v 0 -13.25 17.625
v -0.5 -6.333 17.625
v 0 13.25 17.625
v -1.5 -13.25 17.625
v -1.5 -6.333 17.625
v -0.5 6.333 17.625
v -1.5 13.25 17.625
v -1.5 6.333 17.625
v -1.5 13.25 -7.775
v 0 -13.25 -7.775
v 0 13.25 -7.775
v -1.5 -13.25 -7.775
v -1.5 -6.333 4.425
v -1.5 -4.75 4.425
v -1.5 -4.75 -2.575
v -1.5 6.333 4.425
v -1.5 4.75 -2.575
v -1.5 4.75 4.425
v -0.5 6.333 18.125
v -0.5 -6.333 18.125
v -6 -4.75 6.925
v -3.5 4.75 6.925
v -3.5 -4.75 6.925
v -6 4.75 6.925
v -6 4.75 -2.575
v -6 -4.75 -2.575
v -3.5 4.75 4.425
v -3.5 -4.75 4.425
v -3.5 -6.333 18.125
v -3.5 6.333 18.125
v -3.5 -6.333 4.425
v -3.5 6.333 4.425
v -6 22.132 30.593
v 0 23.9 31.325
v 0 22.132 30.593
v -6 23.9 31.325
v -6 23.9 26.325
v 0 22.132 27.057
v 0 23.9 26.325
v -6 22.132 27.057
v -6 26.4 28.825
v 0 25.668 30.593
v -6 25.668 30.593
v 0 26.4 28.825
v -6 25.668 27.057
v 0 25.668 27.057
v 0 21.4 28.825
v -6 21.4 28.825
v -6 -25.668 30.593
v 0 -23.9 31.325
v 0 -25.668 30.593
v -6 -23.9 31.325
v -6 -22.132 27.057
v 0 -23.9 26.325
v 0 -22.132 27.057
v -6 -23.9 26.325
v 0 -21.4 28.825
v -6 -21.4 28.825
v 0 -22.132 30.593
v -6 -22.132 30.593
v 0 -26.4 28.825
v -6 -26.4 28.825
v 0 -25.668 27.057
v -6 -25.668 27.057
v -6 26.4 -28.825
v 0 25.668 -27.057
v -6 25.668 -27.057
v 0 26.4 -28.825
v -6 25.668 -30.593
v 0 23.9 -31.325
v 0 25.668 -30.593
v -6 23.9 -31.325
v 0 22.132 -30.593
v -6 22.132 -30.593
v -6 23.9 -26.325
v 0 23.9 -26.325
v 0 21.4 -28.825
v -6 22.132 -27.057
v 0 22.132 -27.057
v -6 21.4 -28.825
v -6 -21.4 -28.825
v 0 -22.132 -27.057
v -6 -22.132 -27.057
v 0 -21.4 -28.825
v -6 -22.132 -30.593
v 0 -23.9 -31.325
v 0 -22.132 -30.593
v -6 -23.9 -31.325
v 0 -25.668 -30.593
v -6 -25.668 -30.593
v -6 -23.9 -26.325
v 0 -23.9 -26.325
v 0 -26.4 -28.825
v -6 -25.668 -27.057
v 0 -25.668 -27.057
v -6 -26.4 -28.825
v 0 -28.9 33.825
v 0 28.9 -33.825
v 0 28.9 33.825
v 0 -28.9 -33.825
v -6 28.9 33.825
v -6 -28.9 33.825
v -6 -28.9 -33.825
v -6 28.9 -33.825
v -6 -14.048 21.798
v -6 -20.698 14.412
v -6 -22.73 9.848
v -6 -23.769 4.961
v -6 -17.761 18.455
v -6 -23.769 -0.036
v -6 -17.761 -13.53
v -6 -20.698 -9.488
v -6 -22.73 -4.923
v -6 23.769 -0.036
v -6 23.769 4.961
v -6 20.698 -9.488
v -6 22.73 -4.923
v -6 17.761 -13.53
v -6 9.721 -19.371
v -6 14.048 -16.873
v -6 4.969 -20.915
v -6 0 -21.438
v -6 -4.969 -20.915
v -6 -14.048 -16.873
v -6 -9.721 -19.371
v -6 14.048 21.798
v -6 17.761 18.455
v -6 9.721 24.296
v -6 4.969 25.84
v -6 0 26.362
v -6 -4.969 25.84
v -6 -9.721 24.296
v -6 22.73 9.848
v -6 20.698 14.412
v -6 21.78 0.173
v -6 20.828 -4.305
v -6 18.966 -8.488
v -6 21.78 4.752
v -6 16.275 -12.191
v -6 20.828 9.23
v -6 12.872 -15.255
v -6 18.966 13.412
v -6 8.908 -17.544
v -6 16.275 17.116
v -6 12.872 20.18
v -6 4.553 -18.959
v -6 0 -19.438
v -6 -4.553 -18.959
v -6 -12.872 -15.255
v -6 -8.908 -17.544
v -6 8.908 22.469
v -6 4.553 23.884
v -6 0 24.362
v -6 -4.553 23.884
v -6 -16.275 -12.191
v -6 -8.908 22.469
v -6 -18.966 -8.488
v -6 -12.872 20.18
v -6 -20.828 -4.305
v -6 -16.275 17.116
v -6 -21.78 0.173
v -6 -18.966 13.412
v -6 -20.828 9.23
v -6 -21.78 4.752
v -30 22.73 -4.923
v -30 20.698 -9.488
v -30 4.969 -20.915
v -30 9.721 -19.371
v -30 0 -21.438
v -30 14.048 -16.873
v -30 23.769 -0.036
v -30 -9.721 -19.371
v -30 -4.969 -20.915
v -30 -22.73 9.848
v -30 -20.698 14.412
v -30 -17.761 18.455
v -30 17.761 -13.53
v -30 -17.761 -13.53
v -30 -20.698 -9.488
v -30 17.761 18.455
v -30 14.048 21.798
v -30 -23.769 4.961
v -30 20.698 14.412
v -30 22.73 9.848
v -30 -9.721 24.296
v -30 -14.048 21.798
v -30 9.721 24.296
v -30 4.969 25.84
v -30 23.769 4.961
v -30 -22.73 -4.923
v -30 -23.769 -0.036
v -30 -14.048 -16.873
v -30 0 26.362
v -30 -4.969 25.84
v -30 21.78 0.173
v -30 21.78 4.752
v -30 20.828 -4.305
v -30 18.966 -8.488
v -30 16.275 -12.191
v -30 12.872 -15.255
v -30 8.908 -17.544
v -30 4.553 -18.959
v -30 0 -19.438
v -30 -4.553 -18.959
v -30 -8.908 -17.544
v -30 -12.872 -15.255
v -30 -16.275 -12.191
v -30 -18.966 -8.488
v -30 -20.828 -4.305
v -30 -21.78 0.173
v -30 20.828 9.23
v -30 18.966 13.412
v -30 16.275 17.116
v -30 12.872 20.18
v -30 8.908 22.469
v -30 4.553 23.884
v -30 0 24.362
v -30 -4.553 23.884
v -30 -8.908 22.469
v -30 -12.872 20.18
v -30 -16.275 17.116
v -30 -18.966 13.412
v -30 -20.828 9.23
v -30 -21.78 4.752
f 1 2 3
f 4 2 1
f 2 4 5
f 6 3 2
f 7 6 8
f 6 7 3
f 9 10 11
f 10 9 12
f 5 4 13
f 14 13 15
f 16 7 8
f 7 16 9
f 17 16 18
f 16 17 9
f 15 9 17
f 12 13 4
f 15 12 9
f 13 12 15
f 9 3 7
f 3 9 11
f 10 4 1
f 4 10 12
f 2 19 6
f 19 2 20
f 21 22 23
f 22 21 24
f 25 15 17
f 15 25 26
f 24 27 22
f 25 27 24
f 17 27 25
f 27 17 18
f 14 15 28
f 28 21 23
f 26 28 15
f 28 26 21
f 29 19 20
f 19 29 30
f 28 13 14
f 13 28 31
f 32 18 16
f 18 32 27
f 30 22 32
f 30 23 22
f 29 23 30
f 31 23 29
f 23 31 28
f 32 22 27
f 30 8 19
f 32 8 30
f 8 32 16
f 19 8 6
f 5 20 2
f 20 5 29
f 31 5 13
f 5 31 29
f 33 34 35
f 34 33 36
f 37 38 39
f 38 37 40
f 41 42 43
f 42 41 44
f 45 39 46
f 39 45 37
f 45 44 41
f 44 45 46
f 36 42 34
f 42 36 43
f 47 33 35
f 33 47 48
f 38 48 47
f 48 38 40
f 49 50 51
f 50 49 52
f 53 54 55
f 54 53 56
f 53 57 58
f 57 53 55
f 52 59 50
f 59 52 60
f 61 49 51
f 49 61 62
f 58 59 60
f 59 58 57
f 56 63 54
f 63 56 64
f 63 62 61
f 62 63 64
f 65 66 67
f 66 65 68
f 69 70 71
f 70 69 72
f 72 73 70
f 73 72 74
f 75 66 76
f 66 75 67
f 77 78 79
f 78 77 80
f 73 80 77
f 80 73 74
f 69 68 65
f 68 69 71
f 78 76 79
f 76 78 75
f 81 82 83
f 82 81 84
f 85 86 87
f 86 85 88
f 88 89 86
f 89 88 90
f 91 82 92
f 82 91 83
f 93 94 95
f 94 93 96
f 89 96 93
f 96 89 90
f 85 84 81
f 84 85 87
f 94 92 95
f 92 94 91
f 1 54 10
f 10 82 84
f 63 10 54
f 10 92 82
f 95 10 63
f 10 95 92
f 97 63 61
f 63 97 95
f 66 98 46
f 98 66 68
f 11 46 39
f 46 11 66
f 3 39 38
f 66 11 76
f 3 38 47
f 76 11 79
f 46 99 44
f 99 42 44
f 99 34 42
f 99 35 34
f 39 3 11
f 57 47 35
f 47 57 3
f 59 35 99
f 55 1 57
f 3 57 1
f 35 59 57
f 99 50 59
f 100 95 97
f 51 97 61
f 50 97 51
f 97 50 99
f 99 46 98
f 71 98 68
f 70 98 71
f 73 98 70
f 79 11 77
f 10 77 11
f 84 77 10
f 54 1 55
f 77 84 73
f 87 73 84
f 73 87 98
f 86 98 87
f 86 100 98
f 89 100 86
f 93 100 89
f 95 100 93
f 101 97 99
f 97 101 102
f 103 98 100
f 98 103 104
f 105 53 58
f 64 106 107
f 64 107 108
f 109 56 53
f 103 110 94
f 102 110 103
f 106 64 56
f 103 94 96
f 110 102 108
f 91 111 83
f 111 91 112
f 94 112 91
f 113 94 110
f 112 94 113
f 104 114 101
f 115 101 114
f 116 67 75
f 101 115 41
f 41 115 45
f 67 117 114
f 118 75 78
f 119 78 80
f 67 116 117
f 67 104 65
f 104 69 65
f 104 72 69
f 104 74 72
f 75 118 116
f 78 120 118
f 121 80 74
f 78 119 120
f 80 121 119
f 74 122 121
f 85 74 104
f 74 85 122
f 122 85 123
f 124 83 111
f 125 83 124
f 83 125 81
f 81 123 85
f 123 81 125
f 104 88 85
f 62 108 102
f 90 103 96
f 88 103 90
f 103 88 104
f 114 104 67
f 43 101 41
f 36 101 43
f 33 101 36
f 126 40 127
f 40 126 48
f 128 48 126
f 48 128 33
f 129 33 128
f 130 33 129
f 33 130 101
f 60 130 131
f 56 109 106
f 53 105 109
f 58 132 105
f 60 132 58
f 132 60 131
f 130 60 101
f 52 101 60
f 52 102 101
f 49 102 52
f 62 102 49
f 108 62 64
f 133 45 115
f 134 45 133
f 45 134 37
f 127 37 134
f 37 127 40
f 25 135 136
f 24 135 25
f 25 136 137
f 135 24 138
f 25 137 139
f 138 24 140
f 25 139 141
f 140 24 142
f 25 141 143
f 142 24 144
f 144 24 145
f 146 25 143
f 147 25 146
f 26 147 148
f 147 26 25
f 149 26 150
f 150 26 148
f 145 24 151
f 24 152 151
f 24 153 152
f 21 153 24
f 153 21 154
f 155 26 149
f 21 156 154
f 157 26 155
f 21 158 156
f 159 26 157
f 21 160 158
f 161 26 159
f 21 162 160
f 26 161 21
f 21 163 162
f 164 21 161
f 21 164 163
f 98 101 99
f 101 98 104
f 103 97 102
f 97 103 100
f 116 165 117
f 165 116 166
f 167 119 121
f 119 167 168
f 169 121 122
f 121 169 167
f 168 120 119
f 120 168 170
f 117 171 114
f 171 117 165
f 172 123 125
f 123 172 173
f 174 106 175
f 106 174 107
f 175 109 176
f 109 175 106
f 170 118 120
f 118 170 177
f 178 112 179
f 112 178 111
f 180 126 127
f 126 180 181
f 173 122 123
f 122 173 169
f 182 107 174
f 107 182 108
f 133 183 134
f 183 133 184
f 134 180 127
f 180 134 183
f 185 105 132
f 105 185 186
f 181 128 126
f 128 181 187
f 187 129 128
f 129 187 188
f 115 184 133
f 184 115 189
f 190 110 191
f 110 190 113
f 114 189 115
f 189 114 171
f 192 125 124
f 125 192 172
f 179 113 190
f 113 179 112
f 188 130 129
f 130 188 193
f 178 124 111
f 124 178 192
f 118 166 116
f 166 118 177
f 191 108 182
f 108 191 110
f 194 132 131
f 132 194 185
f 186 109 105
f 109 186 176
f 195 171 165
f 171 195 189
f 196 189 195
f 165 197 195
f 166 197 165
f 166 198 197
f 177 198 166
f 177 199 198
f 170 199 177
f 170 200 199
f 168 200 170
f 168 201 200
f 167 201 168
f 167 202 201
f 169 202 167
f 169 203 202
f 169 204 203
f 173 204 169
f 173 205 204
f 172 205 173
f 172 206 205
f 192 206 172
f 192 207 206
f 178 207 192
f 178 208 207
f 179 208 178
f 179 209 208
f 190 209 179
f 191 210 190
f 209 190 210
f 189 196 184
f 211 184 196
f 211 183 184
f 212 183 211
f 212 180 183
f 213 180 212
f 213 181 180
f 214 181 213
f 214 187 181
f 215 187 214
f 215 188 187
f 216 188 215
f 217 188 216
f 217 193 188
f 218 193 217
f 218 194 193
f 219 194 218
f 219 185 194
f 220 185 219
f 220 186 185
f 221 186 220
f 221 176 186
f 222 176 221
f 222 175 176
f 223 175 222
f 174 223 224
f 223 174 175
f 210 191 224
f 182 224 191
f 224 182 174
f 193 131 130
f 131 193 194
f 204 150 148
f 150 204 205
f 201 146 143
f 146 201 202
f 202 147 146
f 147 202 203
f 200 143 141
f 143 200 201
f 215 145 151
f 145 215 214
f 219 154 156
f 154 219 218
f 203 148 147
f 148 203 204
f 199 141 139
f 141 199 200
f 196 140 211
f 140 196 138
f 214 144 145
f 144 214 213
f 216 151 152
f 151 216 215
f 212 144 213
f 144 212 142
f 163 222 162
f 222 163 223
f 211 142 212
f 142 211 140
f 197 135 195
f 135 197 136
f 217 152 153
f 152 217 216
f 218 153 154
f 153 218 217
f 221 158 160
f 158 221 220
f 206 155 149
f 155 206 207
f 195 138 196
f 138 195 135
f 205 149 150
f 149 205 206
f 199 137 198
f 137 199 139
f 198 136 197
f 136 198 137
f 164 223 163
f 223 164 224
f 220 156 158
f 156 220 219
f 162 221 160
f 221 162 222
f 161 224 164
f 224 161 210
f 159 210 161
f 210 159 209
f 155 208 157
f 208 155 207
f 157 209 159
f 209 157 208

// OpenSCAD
// file: ../cameramount/PiCameraMount.scad
/*
 * openSCAD for a simple mount for the Raspberry PI Camera Module
 *
 * This file is not for standalone use - it's included in to another
 * openSCAN file for including in to another model.
 *
 * Copyright 2015 Peter T Mount
 * 
 * Licensed under the Apache License, Version 2.0 (the "License");
 * you may not use this file except in compliance with the License.
 * You may obtain a copy of the License at
 * 
 * http://www.apache.org/licenses/LICENSE-2.0
 * 
 * Unless required by applicable law or agreed to in writing, software
 * distributed under the License is distributed on an "AS IS" BASIS,
 * WITHOUT WARRANTIES OR CONDITIONS OF ANY KIND, either express or implied.
 * See the License for the specific language governing permissions and
 * limitations under the License.
 *
 */

/*
 * Measured dimensions of a PI Camera Module.
 *
 * These are based on actual measurements and those manually measured by Gert van Loo
 * and published on Scribd:
 *
 *		http://www.scribd.com/doc/142718448/Raspberry-Pi-Camera-Mechanical-Data
 *
 * Width & Depth are the exterior dimensions, width being the edge with the ribbon.
 *
 * We add 1.5 to these to give some room and account for the printer as it seems
 * to give a better fit.
 *
 * y offset is the height from the bottom of the center of the camera lens.
 *
 * ribbon width is just that, if required
 */
piCameraWidth=25 +1.5;
piCameraDepth=23.9 +1.5;
piCameraRibbonWidth=16.2 +0.5;
piCameraLensSize=8 +1.5;
piCameraYOffset=5.1+(piCameraLensSize/2);

/*
 * Module to render a PI camera mount.
 *
 * To use translate it into the required position so that the camera lens
 * is at the origin & pointing along the x axis.
 *
 * Then call piCameraMount(radius,mode)
 *
 * Where:
 *		width	the width of the component
 *		mode	The mode of the render
 *
 * The width must be >30mm as it's used to include the mounting hardware.
 * However you can enlarge it.
 *
 * The mode defines how it's rendered:
 *		0	Render the front panel
 *		1	Render the back panel
 *		2	Render a plain panel with just the mounting holes
 *    3	As 1 but cable exit on back is internal rather than at the bottom of the plate
 */

module piCamera(width,mode) {
	assign(
		tubeRadius=width/2,
		piCameraLensHalf=piCameraLensSize/2,
		piCameraWHalf=piCameraWidth/2,
		piCameraDHalf=piCameraDepth/2,
		offset=piCameraYOffset
	) {
		translate([0,0,piCameraYOffset/2]) union() {
			// Front panel
			difference() {
				if(mode==1 || mode==3)
					translate([6,-tubeRadius,-tubeRadius-offset]) cube([6,width,width+offset]);
				else
					translate([0,-tubeRadius,-tubeRadius-offset]) cube([6,width,width+offset]);

//				translate([4,-tubeRadius-1,-tubeRadius-offset-1]) cube([2,width+2,width+offset+2]);

				if(mode!=2) {
					// Holder for the pi camera module
					translate([4.5,-piCameraWHalf,-piCameraDHalf])
						cube([2.2,piCameraWidth,piCameraDepth]);

					// Holder for components on rear of module
					translate([6,1-piCameraWHalf,1-piCameraDHalf])
						cube([3,piCameraWidth-2,piCameraDepth-2]);
					translate([6,-piCameraWHalf,-piCameraDHalf])
						cube([3,piCameraWidth,9.5]);

					// Hole for the camera lens
					translate([-0.5,-piCameraLensHalf,2-piCameraLensSize])
						cube([6,piCameraLensSize,piCameraLensSize]);

					// Indent for ribbon holder on front of the module
					translate([2.5,-piCameraLensSize*2/3,-0.5])
						cube([3,piCameraLensSize*4/3,piCameraDHalf+1]);
		
					// Space for ribbon cable
					if(mode==1)
						translate([ 5, -piCameraRibbonWidth/2,-tubeRadius-1-offset])
							cube([3,piCameraRibbonWidth,tubeRadius+1+offset]);
					else if(mode==3) {
						translate([ 5, -piCameraRibbonWidth/2,14-tubeRadius-1-offset])
							cube([4,piCameraRibbonWidth,15]);
						translate([ 5, -piCameraRibbonWidth/2,14-tubeRadius-1-offset])
							cube([10,piCameraRibbonWidth,5]);
					}
				}

				// M4 mounting holes
				piCameraHoles(width,15);
			}
		}

	}
}

module piCameraHoles(width,h) {
	assign(tubeRadius=width/2) {
		for(h=[0:3])
			translate([-1,
				(h%2) ? (-tubeRadius+5) : (tubeRadius-5),
				(floor(h/2)) ? (-tubeRadius+5-piCameraYOffset) : (tubeRadius-5)
			])
			rotate([0,90,0])
			cylinder(h=15,r=2.5);
	}
}
// file: ../Common.scad
/*
 * openSCAD Common features
 *
 * This file is not for standalone use - it's included in to another
 * openSCAN file for including in to another model.
 *
 * Copyright 2015 Peter T Mount
 * 
 * Licensed under the Apache License, Version 2.0 (the "License");
 * you may not use this file except in compliance with the License.
 * You may obtain a copy of the License at
 * 
 * http://www.apache.org/licenses/LICENSE-2.0
 * 
 * Unless required by applicable law or agreed to in writing, software
 * distributed under the License is distributed on an "AS IS" BASIS,
 * WITHOUT WARRANTIES OR CONDITIONS OF ANY KIND, either express or implied.
 * See the License for the specific language governing permissions and
 * limitations under the License.
 *
 */

/*
 * Bolt sizes - these are for the holes hence +0.25mm, measurements in radius
 */
M4=2.25;
M5=2.75;
M6=3.25;

/*
 * Raspberry PI Specification
 */
// Dimensions of a HAT
PIHAT_WIDTH=65;
PIHAT_HEIGHT=56.5;

// Edge radius
PIHAT_EDGE_RADIUS=3;

// Hole spacing, center-to-center
PIHAT_WIDTH_HOLE=58;
PIHAT_DEPTH_HOLE=49;

// Hole diameter on HAT as per spec
PIHAT_HOLE_DIAM=2.75;

// Max diameter of hole PAD on HAT as per spec
PIHAT_HOLE_PAD_DIAM=6.2;

// Hole offset from HAT corners
PIHAT_OFFSET_X=3.5;
PIHAT_OFFSET_Y=3.5;

// PI dimensions. A+ is same size as the HAT, B+, 2B, 3B are wider by 25mm
PI_A_WIDTH=PIHAT_WIDTH;
PI_A_HEIGHT=PIHAT_HEIGHT;

PI_B_WIDTH=85;
PI_B_HEIGHT=PIHAT_HEIGHT;

PI_Z_WIDTH=65;
PI_Z_HEIGHT=30;

// The Camera/DSI slot dimensions
PI_CSI_WIDTH=17;
PI_CSI_HEIGHT=2;

// Position of CSI from bottom left
PI_CSI_OFFSET_X=45;
PI_CSI_OFFSET_Y=11.5;

// Position of DSI from bottom left
PI_DSI_OFFSET_X=5;
PI_DSI_OFFSET_Y=PIHAT_HEIGHT/2;

// Position of GPIO connector from Top Left mounting hole
PI_GPIO_OFFSET_X=29;
PI_GPIO_OFFSET_Y=0;
PI_GPIO_WIDTH=PIHAT_WIDTH_HOLE-PIHAT_HOLE_DIAM-1;
PI_GPIO_DEPTH=12;
PI_GPIO_HEIGHT=5;
// file: eyepiece.scad
/*
 * openSCAD for an adapter for attaching the Raspberry PI Camera Module 
 * to a telescope.
 *
 * This model comes in two parts, the eyepiece mount which attaches directly
 * to the telescope (no eyepiece required) and the back plate.
 *
 * However it's intended that the backplate be incorporated into another model
 * so that the PI itself is mounted with the camera.
 *
 * Copyright 2015 Peter T Mount
 * 
 * Licensed under the Apache License, Version 2.0 (the "License");
 * you may not use this file except in compliance with the License.
 * You may obtain a copy of the License at
 * 
 * http://www.apache.org/licenses/LICENSE-2.0
 * 
 * Unless required by applicable law or agreed to in writing, software
 * distributed under the License is distributed on an "AS IS" BASIS,
 * WITHOUT WARRANTIES OR CONDITIONS OF ANY KIND, either express or implied.
 * See the License for the specific language governing permissions and
 * limitations under the License.
 *
 */

include <../Common.scad>
include <../cameramount/PiCameraMount.scad>

module eyepiece(diam,mode) {
	// eyediam is the eyepiece diameter, adjusting for extruder diameter
	assign(
		eyediam=(diam*25.4)-3
	) {
		assign(
			eyerad=eyediam/2,
			eyewidth=max(50,eyediam+10)
		) {
			if(mode==0 || mode==2) translate([-6,0,0]) eyepieceFront(eyewidth,eyerad);
			if(mode==1 || mode==2) translate([-6,0,0]) eyepieceBack(eyewidth);
			if(mode==3) {
			  	translate([6,0,0]) rotate([0,0,180]) eyepieceFront(eyewidth,eyerad);
				translate([-6,-eyewidth*3/2,0]) eyepieceBack(eyewidth);
			}
		}
	}
}

module eyepieceFront(eyewidth,eyerad) {
	union() {
		piCamera(eyewidth,0);
		translate([-24,0,piCameraYOffset/4]) rotate([0,90,0]) difference() {
			cylinder( h=24,r=eyerad);
			translate([0,0,-2]) cylinder( h=27,r=eyerad-2);
		}
	}
}

module eyepieceBack(eyewidth) {
	piCamera(eyewidth,3);
}
// main file
/*
 * openSCAD for an adapter for attaching the Raspberry PI Camera Module 
 * to a telescope.
 *
 * This model comes in two parts, the eyepiece mount which attaches directly
 * to the telescope (no eyepiece required) and the back plate.
 *
 * However it's intended that the backplate be incorporated into another model
 * so that the PI itself is mounted with the camera.
 *
 * Copyright 2015 Peter T Mount
 * 
 * Licensed under the Apache License, Version 2.0 (the "License");
 * you may not use this file except in compliance with the License.
 * You may obtain a copy of the License at
 * 
 * http://www.apache.org/licenses/LICENSE-2.0
 * 
 * Unless required by applicable law or agreed to in writing, software
 * distributed under the License is distributed on an "AS IS" BASIS,
 * WITHOUT WARRANTIES OR CONDITIONS OF ANY KIND, either express or implied.
 * See the License for the specific language governing permissions and
 * limitations under the License.
 *
 */

include <eyepiece.scad>

eyepiece(2,0);
